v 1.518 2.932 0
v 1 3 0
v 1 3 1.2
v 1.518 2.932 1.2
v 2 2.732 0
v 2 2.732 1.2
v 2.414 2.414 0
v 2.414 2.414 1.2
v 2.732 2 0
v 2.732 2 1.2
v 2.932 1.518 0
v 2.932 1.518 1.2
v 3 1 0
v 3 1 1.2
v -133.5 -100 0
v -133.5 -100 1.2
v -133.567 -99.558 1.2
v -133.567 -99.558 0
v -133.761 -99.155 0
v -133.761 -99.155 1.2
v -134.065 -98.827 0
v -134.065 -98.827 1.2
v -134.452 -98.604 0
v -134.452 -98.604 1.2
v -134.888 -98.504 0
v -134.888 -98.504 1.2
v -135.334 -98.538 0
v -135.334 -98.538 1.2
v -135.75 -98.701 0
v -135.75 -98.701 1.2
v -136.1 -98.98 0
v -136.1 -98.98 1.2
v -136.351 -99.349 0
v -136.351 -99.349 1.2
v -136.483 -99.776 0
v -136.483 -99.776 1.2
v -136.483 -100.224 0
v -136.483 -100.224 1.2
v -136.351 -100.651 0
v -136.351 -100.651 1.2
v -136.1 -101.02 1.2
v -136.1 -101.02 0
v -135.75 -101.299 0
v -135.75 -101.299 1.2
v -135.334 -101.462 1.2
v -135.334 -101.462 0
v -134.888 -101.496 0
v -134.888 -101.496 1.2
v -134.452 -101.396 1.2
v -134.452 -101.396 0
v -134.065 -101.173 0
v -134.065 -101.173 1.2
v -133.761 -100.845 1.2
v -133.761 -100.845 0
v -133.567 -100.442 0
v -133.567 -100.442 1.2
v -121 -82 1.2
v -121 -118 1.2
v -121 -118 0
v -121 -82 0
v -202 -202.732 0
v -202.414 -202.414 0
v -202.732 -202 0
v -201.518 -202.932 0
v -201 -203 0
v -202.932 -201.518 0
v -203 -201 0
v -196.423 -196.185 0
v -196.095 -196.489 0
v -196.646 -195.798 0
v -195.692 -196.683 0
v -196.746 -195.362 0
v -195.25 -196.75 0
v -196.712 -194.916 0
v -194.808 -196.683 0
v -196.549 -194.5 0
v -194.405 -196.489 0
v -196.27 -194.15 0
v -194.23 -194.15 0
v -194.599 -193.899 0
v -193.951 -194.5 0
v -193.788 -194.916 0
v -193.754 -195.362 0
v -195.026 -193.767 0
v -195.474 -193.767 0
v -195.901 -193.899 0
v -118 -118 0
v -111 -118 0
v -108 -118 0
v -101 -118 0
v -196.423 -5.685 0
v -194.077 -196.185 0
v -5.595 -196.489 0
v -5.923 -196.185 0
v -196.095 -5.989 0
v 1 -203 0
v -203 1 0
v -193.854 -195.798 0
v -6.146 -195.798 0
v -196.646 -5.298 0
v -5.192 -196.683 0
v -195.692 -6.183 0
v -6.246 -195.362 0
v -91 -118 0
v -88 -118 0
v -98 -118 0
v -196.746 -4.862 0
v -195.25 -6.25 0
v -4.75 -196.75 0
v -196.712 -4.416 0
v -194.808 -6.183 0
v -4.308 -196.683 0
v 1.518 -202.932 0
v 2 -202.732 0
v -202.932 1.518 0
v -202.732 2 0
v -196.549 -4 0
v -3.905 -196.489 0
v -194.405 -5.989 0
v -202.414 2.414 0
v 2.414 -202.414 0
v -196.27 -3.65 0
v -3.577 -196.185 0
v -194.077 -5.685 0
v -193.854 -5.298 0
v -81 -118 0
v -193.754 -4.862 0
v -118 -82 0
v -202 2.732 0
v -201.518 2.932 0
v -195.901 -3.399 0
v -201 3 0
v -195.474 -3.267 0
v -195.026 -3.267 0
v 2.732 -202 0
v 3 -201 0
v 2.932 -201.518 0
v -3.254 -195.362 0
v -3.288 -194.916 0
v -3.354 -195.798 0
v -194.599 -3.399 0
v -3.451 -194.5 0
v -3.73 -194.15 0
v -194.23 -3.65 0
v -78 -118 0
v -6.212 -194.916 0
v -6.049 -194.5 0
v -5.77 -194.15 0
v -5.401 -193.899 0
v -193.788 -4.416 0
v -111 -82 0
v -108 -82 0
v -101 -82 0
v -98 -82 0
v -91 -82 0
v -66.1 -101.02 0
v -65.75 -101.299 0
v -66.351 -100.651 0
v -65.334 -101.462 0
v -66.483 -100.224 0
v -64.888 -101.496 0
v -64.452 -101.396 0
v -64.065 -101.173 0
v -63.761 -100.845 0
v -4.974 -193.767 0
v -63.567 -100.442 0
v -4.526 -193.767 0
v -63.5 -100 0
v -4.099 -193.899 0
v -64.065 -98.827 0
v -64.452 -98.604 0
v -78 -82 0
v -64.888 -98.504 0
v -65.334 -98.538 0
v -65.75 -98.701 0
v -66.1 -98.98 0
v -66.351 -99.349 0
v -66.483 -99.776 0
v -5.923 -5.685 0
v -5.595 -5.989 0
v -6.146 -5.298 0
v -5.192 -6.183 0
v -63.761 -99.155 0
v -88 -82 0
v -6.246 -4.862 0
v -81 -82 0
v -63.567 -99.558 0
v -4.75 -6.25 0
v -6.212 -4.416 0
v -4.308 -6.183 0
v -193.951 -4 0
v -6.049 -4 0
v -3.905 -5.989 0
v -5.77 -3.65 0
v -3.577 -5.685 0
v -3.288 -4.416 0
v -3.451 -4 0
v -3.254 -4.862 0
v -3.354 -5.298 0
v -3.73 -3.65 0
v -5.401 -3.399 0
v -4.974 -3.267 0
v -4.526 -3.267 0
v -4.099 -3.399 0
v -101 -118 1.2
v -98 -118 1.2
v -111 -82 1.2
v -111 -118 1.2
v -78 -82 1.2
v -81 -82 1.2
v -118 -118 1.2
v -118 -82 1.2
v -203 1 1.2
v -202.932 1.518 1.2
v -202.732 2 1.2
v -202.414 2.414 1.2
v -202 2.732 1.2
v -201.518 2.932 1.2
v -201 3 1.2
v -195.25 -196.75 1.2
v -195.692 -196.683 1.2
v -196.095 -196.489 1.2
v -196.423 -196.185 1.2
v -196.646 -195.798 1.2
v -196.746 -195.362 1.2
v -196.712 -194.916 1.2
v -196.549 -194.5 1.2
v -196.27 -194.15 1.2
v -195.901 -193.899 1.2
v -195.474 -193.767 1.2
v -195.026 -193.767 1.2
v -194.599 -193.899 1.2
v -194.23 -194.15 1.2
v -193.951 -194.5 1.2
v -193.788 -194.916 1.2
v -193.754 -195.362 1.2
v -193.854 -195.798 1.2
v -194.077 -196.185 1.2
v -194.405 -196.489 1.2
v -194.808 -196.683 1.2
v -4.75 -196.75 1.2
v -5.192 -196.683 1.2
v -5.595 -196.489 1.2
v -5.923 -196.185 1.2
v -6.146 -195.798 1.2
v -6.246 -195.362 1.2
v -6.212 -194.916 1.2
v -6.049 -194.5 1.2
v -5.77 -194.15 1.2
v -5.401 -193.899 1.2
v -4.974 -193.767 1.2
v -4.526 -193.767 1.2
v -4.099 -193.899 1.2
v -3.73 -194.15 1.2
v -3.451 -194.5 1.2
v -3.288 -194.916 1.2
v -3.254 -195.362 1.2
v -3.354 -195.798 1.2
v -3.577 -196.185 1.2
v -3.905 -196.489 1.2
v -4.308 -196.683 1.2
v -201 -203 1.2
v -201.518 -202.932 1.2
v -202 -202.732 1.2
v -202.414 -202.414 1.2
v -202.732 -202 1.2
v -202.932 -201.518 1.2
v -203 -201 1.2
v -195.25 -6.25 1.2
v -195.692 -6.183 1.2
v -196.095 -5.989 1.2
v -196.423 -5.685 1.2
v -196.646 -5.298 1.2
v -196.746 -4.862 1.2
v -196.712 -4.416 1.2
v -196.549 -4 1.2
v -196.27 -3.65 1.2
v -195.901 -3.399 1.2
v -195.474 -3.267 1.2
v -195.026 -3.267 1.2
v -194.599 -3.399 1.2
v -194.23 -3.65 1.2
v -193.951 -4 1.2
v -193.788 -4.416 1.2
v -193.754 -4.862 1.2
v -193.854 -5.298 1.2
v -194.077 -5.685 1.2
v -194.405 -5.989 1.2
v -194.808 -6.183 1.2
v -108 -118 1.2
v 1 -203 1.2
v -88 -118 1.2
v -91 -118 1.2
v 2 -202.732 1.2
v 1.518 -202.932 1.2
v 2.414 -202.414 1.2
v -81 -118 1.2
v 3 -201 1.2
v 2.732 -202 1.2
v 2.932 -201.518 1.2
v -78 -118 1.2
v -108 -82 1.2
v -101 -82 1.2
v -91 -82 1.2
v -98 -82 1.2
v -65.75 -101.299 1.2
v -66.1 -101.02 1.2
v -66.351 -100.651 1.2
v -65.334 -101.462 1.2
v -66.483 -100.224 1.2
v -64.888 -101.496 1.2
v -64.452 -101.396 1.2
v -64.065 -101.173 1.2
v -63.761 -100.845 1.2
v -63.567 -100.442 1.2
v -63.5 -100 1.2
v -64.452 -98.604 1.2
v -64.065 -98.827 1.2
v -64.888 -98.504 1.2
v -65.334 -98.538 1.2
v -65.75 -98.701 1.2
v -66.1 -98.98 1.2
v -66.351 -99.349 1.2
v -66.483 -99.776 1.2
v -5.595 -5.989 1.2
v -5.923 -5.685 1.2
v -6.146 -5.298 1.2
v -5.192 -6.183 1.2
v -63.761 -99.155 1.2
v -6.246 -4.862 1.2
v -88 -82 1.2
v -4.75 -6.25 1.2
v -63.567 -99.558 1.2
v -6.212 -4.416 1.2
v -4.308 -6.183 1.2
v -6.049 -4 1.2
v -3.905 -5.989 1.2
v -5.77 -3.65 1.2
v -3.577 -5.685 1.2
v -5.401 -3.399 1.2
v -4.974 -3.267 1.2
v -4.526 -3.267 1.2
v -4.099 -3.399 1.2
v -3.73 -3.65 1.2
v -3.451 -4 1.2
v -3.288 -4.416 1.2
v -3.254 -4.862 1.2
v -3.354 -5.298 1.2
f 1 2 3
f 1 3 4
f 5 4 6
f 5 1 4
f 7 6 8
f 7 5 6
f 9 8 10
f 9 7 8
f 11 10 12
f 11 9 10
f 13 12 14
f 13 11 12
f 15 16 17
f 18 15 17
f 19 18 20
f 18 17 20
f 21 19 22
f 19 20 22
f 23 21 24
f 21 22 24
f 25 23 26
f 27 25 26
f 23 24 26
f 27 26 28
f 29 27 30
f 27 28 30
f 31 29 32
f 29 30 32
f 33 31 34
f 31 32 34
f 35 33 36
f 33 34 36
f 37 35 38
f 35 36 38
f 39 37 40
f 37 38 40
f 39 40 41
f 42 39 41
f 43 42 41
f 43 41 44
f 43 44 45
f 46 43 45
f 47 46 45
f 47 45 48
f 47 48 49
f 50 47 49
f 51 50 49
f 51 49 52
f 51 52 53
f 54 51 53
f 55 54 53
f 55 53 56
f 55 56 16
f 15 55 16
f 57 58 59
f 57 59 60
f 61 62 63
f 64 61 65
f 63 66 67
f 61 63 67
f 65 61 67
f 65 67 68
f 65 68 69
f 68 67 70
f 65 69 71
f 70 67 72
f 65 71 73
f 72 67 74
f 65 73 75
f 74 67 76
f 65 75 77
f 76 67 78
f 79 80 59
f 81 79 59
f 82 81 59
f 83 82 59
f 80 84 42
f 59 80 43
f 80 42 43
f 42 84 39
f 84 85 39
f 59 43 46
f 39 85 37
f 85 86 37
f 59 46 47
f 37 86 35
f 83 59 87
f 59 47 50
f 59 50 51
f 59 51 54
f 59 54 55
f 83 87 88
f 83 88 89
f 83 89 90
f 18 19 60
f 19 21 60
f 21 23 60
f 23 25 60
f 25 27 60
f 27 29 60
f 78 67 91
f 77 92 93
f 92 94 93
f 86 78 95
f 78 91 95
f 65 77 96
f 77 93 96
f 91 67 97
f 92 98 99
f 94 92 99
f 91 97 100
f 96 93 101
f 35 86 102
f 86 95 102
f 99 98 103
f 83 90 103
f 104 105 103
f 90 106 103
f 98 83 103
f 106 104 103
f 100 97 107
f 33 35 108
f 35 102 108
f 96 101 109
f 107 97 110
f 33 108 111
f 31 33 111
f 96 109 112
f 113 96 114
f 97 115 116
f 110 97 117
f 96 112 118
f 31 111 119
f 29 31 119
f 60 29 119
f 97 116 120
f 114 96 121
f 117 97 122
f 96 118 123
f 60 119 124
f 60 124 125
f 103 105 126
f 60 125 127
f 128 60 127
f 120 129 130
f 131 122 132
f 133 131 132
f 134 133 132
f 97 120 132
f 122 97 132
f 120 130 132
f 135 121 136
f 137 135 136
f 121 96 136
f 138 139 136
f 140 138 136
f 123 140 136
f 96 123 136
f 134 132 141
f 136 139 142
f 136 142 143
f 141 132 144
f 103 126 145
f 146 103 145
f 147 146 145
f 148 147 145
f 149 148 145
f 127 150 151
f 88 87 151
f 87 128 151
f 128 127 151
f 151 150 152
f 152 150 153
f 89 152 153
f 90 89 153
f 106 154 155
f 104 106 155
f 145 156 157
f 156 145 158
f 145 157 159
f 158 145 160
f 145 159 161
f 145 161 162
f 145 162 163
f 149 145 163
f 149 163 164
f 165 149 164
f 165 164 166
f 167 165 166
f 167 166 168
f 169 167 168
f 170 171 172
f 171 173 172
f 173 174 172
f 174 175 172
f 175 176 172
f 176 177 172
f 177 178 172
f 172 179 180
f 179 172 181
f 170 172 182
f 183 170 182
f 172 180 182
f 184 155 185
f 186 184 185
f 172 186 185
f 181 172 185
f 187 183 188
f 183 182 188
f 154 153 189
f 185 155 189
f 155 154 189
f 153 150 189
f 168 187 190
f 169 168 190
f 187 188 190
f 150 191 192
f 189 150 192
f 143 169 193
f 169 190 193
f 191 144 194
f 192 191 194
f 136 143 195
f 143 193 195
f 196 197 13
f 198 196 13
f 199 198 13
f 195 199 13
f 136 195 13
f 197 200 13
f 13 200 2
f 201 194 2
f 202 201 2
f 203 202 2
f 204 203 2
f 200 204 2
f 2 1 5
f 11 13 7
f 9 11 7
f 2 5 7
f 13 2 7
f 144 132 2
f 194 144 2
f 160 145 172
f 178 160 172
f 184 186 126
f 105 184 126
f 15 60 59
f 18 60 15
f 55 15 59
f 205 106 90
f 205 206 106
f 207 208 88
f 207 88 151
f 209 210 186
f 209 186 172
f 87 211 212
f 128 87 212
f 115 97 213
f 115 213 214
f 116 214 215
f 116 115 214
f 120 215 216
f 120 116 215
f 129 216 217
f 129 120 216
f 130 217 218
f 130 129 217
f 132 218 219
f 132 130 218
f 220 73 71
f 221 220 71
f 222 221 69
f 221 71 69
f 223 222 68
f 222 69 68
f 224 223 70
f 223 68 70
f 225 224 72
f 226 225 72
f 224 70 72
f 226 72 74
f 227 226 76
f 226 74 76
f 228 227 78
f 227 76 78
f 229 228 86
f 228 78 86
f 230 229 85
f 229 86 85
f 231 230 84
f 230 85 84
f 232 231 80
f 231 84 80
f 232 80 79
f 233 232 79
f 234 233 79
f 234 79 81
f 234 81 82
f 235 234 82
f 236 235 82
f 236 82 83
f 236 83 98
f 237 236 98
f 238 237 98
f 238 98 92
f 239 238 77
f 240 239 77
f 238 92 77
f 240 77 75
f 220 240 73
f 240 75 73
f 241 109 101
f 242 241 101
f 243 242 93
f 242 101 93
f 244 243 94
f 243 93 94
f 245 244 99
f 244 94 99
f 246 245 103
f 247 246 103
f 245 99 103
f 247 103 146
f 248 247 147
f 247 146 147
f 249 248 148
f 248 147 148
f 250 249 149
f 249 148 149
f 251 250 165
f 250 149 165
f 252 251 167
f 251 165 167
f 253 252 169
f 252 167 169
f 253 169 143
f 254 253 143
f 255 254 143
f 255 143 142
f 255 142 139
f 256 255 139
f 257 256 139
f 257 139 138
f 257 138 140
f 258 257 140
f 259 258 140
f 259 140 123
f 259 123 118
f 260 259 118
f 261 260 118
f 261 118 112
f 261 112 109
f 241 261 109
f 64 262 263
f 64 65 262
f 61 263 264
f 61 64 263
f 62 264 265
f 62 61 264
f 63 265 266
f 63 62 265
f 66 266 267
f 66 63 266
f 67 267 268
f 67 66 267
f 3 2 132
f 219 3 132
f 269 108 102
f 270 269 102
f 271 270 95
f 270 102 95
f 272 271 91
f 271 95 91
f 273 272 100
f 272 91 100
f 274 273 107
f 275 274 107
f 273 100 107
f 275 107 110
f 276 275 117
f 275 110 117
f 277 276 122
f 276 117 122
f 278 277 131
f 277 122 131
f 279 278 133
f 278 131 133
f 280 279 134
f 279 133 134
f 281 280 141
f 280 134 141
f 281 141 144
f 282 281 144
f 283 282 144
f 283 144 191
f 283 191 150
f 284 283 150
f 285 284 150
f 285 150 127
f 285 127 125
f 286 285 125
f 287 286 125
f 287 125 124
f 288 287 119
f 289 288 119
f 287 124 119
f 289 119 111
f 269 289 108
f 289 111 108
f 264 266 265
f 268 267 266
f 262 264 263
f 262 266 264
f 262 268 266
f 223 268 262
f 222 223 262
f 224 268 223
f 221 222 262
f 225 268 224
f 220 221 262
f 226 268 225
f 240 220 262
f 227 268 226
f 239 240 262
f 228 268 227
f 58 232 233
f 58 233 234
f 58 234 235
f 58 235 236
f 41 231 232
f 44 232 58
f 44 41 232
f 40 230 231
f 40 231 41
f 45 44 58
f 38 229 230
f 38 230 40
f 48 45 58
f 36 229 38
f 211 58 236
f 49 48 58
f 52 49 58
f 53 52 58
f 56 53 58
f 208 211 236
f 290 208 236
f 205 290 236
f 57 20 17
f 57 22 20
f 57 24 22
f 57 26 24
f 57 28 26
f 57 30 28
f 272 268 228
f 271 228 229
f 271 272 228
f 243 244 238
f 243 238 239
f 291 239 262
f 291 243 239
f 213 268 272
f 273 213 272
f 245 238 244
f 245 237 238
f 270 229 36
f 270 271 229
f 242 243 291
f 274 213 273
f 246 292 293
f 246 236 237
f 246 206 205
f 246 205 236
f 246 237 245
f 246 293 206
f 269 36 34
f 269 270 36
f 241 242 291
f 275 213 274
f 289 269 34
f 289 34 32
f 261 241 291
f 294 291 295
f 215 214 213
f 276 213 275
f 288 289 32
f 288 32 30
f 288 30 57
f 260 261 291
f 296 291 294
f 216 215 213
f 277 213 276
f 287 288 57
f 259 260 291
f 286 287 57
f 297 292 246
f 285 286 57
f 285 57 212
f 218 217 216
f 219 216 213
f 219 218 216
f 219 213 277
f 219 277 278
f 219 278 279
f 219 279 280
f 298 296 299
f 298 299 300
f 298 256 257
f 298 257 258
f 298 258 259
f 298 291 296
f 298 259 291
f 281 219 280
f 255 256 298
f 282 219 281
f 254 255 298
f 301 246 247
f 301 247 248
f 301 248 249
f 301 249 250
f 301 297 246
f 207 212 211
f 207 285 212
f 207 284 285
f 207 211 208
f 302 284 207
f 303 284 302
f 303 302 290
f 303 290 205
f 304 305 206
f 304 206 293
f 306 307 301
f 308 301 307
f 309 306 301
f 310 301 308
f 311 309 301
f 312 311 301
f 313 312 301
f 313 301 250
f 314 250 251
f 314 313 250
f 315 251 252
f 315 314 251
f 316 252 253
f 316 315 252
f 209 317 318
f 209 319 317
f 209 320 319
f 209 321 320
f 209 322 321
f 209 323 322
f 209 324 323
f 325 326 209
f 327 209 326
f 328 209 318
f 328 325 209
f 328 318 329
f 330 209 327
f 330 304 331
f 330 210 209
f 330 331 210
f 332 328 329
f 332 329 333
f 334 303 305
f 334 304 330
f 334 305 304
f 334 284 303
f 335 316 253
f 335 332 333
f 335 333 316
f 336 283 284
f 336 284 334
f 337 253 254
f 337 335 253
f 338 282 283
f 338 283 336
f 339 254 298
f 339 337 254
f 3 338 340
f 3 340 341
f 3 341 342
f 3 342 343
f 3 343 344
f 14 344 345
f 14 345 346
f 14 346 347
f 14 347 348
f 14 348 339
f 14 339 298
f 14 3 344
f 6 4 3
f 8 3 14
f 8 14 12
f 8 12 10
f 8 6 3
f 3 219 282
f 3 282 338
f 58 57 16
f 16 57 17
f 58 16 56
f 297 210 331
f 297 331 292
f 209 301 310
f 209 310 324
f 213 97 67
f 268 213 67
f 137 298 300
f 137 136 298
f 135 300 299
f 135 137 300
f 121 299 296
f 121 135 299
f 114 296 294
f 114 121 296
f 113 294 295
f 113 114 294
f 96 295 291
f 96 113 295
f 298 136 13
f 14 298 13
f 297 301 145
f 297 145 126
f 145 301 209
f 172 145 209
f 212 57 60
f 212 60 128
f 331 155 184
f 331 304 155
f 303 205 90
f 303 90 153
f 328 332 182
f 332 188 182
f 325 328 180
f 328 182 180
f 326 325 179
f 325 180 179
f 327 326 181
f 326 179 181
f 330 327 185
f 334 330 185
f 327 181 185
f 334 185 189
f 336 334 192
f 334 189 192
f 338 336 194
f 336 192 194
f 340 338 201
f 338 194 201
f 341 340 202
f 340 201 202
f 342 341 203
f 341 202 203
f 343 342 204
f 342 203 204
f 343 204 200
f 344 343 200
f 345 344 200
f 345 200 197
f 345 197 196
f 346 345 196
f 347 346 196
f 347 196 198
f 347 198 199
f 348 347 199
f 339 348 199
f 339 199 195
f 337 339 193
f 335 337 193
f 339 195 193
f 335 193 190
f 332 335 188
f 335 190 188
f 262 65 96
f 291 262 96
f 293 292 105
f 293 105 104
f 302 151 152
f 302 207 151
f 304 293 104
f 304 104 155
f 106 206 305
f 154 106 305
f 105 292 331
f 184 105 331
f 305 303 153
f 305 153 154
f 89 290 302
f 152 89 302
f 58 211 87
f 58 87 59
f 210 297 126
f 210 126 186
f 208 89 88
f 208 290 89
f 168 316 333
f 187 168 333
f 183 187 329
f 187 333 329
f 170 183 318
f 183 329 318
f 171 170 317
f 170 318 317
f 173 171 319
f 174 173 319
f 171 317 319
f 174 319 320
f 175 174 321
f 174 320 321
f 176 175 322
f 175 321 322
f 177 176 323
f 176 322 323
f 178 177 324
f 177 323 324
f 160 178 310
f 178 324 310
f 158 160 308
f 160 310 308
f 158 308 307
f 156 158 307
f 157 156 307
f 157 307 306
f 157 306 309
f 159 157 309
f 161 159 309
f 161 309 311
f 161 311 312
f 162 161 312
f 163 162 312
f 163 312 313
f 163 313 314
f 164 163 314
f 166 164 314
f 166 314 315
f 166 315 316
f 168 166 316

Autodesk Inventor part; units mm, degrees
ref_plane "YZ Plane" through (0, 0, 0) normal (1, 0, 0) x (0, 1, 0)
ref_plane "XZ Plane" through (0, 0, 0) normal (0, 1, 0) x (-1, 0, 0)
ref_plane "XY Plane" through (0, 0, 0) normal (0, 0, 1) x (1, 0, 0)
sketch "Boceto1" plane through (0, 0, 0) normal (0, 0, 1) x (1, 0, 0)
  line L0 (-198, 0) -> (0, 0) projected
  line L1 (-198, 0) -> (-198, -2) projected
  line L2 (0, -2) -> (-198, -2) projected
  line L3 (0, 0) -> (0, -2) projected
  line L4 (0, -2) -> (0, -200) projected
  line L5 (0, -2) -> (-2, -2) projected
  line L6 (-2, -200) -> (-2, -2) projected
  line L7 (0, -200) -> (-2, -200) projected
  line L8 (-2, -200) -> (-200, -200) projected
  line L9 (-2, -200) -> (-2, -198) projected
  line L10 (-200, -198) -> (-2, -198) projected
  line L11 (-200, -200) -> (-200, -198) projected
  line L12 (-200, -198) -> (-200, 0) projected
  line L13 (-200, -198) -> (-198, -198) projected
  line L14 (-198, 0) -> (-198, -198) projected
  line L15 (-200, 0) -> (-198, 0) projected
  line L16 (0, 0) -> (0, 1.6)
  line L17 (0, 1.6) -> (1.6, 1.6)
  line L18 (1.6, 1.6) -> (-201.6, 1.6)
  line L19 (-201.6, 1.6) -> (-201.6, -201.6)
  line L20 (-201.6, -201.6) -> (1.6, -201.6)
  line L21 (1.6, -201.6) -> (1.6, 1.6)
  line L22 (-203, 1) -> (-203, -201) projected
  line L23 (-201, -203) -> (1, -203) projected
  line L24 (3, -201) -> (3, 1) projected
  line L25 (1, 3) -> (-201, 3) projected
  line L26 (-192.75, -7.25) -> (-7.25, -7.25) projected
  line L27 (-7.25, -7.25) -> (-7.25, -192.75) projected
  line L28 (-7.25, -192.75) -> (-192.75, -192.75) projected
  line L29 (-192.75, -192.75) -> (-192.75, -7.25) projected
  circle A0 centre (-195.25, -4.75) radius 2.1 projected
  circle A1 centre (-4.75, -4.75) radius 2.1 projected
  circle A2 centre (-4.75, -195.25) radius 2.1 projected
  circle A3 centre (-195.25, -195.25) radius 2.1 projected
  arc A4 (-201, 3) -> (-203, 1) centre (-201, 1) ccw projected
  arc A5 (-203, -201) -> (-201, -203) centre (-201, -201) ccw projected
  arc A6 (1, -203) -> (3, -201) centre (1, -201) ccw projected
  arc A7 (3, 1) -> (1, 3) centre (1, 1) ccw projected
  dimension "d0" = 1.6
  dimension "d1" = 1.6
  dimension "d2" = 203.2
  dimension "d3" = 203.2
extrude "Extrusión1" add sketch "Boceto1" along normal blind 1.2 contours L17 L21 L20 L19 L18 | L0 L3 L2 L1 | L1 L14 L10 L12 L15 | L2 L6 L10 L14 | L4 L7 L6 L2 | L10 L6 L8 L11 | A4 L25 A7 L24 A6 L23 A5 L22 | L26 L27 L28 L29 | A0 | A1 | A2 | A3
sketch "Boceto2" plane through (0, 0, 1.2) normal (0, 0, 1) x (1, 0, 0)
  line L0 (-192.75, -7.25) -> (-7.25, -7.25) projected
  line L1 (-7.25, -7.25) -> (-7.25, -192.75) projected
  line L2 (-2.25, -197.75) -> (-2.25, -2.25) projected
  line L3 (-2.25, -2.25) -> (-197.75, -2.25) projected
  line L4 (-7.25, -7.25) -> (-2.25, -2.25)
  circle A0 centre (-4.75, -4.75) radius 1.5
  line L5 (-201, -203) -> (1, -203) projected
  line L6 (-203, -203) -> (-203, -195.25)
  line L7 (-203, 1) -> (-203, -201) projected
  line L8 (-203, -195.25) -> (-195.25, -195.25)
  circle A1 centre (-195.25, -195.25) radius 1.5
  line L9 (3, -203) -> (-4.75, -203)
  line L10 (-4.75, -203) -> (-4.75, -195.25)
  circle A2 centre (-4.75, -195.25) radius 1.5
  line L11 (-203, 3) -> (-195.25, 3)
  line L12 (1, 3) -> (-201, 3) projected
  line L13 (-195.25, 3) -> (-195.25, -4.75)
  circle A3 centre (-195.25, -4.75) radius 1.5
  point P0 (0, 0)
  point P1 (3, 3)
  dimension "d6" = 3
  dimension "d14" = 7.75
  dimension "d15" = 7.75
  dimension "d16" = 3
  dimension "d17" = 7.75
  dimension "d18" = 7.75
  dimension "d19" = 3
  dimension "d20" = 7.75
  dimension "d21" = 7.75
  dimension "d22" = 90
  dimension "d23" = 3
hole "Agujero1" at (-4.75, -4.75, 1.2) at (-195.25, -4.75, 1.2) at (-195.25, -195.25, 1.2) at (-4.75, -195.25, 1.2) direction (0, 0, -1) diameter 3 depth 4
sketch "Boceto3" plane through (0, 0, 1.2) normal (0, 0, 1) x (1, 0, 0)
  line L0 (-125, -122.5) -> (-75, -122.5) projected
  arc A0 (-75, -122.5) -> (-70, -117.5) centre (-75, -117.5) ccw projected
  line L1 (-70, -117.5) -> (-70, -112.2474) projected
  arc A1 (-64, -104.899) -> (-70, -112.2474) centre (-62.5, -112.2474) ccw projected
  arc A2 (-64, -104.899) -> (-64, -95.101) centre (-65, -100) ccw projected
  arc A3 (-70, -87.7526) -> (-64, -95.101) centre (-62.5, -87.7526) ccw projected
  line L2 (-70, -87.7526) -> (-70, -82.5) projected
  arc A4 (-70, -82.5) -> (-75, -77.5) centre (-75, -82.5) ccw projected
  line L3 (-75, -77.5) -> (-125, -77.5) projected
  arc A5 (-125, -77.5) -> (-130, -82.5) centre (-125, -82.5) ccw projected
  line L4 (-130, -82.5) -> (-130, -87.7526) projected
  arc A6 (-136, -95.101) -> (-130, -87.7526) centre (-137.5, -87.7526) ccw projected
  arc A7 (-136, -95.101) -> (-136, -104.899) centre (-135, -100) ccw projected
  arc A8 (-130, -112.2474) -> (-136, -104.899) centre (-137.5, -112.2474) ccw projected
  line L5 (-130, -112.2474) -> (-130, -117.5) projected
  arc A9 (-130, -117.5) -> (-125, -122.5) centre (-125, -117.5) ccw projected
  line L6 (-125, -121.5) -> (-75, -121.5) projected
  arc A10 (-75, -121.5) -> (-71, -117.5) centre (-75, -117.5) ccw projected
  line L7 (-71, -117.5) -> (-71, -82.5) projected
  arc A11 (-71, -82.5) -> (-75, -78.5) centre (-75, -82.5) ccw projected
  line L8 (-75, -78.5) -> (-125, -78.5) projected
  arc A12 (-125, -78.5) -> (-129, -82.5) centre (-125, -82.5) ccw projected
  line L9 (-129, -82.5) -> (-129, -117.5) projected
  arc A13 (-129, -117.5) -> (-125, -121.5) centre (-125, -117.5) ccw projected
  line L10 (-75, -118) -> (-125, -118)
  arc A14 (-125.5, -117.5) -> (-125, -118) centre (-125, -117.5) ccw
  line L11 (-125.5, -117.5) -> (-125.5, -82.5)
  arc A15 (-125, -82) -> (-125.5, -82.5) centre (-125, -82.5) ccw
  line L12 (-125, -82) -> (-75, -82)
  arc A16 (-74.5, -82.5) -> (-75, -82) centre (-75, -82.5) ccw
  line L13 (-74.5, -82.5) -> (-74.5, -117.5)
  arc A17 (-75, -118) -> (-74.5, -117.5) centre (-75, -117.5) ccw
  line L14 (-74.5, -118) -> (-74.5, -82)
  line L15 (-78, -118) -> (-78, -82)
  line L16 (-81, -118) -> (-81, -82)
  line L17 (-88, -118) -> (-88, -82)
  line L18 (-91, -118) -> (-91, -82)
  line L19 (-98, -118) -> (-98, -82)
  line L20 (-101, -118) -> (-101, -82)
  line L21 (-108, -118) -> (-108, -82)
  line L22 (-111, -118) -> (-111, -82)
  line L23 (-118, -118) -> (-118, -82)
  line L24 (-121, -118) -> (-121, -82)
  circle A18 centre (-65, -100) radius 1.5
  circle A19 centre (-135, -100) radius 1.5
  point P0 (0, 0)
  dimension "d24" = 3.5
  dimension "d25" = 3
  dimension "d26" = 7
  dimension "d27" = 3
  dimension "d28" = 7
  dimension "d29" = 3
  dimension "d30" = 7
  dimension "d31" = 3
  dimension "d32" = 7
  dimension "d33" = 3
  dimension "d36" = 3
  dimension "d37" = 3
extrude "Extrusión2" cut sketch "Boceto3" against normal blind 3 contours L10 L16 L12 L15 | L10 L18 L12 L17 | L10 L20 L12 L19 | L10 L22 L12 L21 | L10 L24 L12 L23 | A18 | A19
properties part number "Tapadera"
